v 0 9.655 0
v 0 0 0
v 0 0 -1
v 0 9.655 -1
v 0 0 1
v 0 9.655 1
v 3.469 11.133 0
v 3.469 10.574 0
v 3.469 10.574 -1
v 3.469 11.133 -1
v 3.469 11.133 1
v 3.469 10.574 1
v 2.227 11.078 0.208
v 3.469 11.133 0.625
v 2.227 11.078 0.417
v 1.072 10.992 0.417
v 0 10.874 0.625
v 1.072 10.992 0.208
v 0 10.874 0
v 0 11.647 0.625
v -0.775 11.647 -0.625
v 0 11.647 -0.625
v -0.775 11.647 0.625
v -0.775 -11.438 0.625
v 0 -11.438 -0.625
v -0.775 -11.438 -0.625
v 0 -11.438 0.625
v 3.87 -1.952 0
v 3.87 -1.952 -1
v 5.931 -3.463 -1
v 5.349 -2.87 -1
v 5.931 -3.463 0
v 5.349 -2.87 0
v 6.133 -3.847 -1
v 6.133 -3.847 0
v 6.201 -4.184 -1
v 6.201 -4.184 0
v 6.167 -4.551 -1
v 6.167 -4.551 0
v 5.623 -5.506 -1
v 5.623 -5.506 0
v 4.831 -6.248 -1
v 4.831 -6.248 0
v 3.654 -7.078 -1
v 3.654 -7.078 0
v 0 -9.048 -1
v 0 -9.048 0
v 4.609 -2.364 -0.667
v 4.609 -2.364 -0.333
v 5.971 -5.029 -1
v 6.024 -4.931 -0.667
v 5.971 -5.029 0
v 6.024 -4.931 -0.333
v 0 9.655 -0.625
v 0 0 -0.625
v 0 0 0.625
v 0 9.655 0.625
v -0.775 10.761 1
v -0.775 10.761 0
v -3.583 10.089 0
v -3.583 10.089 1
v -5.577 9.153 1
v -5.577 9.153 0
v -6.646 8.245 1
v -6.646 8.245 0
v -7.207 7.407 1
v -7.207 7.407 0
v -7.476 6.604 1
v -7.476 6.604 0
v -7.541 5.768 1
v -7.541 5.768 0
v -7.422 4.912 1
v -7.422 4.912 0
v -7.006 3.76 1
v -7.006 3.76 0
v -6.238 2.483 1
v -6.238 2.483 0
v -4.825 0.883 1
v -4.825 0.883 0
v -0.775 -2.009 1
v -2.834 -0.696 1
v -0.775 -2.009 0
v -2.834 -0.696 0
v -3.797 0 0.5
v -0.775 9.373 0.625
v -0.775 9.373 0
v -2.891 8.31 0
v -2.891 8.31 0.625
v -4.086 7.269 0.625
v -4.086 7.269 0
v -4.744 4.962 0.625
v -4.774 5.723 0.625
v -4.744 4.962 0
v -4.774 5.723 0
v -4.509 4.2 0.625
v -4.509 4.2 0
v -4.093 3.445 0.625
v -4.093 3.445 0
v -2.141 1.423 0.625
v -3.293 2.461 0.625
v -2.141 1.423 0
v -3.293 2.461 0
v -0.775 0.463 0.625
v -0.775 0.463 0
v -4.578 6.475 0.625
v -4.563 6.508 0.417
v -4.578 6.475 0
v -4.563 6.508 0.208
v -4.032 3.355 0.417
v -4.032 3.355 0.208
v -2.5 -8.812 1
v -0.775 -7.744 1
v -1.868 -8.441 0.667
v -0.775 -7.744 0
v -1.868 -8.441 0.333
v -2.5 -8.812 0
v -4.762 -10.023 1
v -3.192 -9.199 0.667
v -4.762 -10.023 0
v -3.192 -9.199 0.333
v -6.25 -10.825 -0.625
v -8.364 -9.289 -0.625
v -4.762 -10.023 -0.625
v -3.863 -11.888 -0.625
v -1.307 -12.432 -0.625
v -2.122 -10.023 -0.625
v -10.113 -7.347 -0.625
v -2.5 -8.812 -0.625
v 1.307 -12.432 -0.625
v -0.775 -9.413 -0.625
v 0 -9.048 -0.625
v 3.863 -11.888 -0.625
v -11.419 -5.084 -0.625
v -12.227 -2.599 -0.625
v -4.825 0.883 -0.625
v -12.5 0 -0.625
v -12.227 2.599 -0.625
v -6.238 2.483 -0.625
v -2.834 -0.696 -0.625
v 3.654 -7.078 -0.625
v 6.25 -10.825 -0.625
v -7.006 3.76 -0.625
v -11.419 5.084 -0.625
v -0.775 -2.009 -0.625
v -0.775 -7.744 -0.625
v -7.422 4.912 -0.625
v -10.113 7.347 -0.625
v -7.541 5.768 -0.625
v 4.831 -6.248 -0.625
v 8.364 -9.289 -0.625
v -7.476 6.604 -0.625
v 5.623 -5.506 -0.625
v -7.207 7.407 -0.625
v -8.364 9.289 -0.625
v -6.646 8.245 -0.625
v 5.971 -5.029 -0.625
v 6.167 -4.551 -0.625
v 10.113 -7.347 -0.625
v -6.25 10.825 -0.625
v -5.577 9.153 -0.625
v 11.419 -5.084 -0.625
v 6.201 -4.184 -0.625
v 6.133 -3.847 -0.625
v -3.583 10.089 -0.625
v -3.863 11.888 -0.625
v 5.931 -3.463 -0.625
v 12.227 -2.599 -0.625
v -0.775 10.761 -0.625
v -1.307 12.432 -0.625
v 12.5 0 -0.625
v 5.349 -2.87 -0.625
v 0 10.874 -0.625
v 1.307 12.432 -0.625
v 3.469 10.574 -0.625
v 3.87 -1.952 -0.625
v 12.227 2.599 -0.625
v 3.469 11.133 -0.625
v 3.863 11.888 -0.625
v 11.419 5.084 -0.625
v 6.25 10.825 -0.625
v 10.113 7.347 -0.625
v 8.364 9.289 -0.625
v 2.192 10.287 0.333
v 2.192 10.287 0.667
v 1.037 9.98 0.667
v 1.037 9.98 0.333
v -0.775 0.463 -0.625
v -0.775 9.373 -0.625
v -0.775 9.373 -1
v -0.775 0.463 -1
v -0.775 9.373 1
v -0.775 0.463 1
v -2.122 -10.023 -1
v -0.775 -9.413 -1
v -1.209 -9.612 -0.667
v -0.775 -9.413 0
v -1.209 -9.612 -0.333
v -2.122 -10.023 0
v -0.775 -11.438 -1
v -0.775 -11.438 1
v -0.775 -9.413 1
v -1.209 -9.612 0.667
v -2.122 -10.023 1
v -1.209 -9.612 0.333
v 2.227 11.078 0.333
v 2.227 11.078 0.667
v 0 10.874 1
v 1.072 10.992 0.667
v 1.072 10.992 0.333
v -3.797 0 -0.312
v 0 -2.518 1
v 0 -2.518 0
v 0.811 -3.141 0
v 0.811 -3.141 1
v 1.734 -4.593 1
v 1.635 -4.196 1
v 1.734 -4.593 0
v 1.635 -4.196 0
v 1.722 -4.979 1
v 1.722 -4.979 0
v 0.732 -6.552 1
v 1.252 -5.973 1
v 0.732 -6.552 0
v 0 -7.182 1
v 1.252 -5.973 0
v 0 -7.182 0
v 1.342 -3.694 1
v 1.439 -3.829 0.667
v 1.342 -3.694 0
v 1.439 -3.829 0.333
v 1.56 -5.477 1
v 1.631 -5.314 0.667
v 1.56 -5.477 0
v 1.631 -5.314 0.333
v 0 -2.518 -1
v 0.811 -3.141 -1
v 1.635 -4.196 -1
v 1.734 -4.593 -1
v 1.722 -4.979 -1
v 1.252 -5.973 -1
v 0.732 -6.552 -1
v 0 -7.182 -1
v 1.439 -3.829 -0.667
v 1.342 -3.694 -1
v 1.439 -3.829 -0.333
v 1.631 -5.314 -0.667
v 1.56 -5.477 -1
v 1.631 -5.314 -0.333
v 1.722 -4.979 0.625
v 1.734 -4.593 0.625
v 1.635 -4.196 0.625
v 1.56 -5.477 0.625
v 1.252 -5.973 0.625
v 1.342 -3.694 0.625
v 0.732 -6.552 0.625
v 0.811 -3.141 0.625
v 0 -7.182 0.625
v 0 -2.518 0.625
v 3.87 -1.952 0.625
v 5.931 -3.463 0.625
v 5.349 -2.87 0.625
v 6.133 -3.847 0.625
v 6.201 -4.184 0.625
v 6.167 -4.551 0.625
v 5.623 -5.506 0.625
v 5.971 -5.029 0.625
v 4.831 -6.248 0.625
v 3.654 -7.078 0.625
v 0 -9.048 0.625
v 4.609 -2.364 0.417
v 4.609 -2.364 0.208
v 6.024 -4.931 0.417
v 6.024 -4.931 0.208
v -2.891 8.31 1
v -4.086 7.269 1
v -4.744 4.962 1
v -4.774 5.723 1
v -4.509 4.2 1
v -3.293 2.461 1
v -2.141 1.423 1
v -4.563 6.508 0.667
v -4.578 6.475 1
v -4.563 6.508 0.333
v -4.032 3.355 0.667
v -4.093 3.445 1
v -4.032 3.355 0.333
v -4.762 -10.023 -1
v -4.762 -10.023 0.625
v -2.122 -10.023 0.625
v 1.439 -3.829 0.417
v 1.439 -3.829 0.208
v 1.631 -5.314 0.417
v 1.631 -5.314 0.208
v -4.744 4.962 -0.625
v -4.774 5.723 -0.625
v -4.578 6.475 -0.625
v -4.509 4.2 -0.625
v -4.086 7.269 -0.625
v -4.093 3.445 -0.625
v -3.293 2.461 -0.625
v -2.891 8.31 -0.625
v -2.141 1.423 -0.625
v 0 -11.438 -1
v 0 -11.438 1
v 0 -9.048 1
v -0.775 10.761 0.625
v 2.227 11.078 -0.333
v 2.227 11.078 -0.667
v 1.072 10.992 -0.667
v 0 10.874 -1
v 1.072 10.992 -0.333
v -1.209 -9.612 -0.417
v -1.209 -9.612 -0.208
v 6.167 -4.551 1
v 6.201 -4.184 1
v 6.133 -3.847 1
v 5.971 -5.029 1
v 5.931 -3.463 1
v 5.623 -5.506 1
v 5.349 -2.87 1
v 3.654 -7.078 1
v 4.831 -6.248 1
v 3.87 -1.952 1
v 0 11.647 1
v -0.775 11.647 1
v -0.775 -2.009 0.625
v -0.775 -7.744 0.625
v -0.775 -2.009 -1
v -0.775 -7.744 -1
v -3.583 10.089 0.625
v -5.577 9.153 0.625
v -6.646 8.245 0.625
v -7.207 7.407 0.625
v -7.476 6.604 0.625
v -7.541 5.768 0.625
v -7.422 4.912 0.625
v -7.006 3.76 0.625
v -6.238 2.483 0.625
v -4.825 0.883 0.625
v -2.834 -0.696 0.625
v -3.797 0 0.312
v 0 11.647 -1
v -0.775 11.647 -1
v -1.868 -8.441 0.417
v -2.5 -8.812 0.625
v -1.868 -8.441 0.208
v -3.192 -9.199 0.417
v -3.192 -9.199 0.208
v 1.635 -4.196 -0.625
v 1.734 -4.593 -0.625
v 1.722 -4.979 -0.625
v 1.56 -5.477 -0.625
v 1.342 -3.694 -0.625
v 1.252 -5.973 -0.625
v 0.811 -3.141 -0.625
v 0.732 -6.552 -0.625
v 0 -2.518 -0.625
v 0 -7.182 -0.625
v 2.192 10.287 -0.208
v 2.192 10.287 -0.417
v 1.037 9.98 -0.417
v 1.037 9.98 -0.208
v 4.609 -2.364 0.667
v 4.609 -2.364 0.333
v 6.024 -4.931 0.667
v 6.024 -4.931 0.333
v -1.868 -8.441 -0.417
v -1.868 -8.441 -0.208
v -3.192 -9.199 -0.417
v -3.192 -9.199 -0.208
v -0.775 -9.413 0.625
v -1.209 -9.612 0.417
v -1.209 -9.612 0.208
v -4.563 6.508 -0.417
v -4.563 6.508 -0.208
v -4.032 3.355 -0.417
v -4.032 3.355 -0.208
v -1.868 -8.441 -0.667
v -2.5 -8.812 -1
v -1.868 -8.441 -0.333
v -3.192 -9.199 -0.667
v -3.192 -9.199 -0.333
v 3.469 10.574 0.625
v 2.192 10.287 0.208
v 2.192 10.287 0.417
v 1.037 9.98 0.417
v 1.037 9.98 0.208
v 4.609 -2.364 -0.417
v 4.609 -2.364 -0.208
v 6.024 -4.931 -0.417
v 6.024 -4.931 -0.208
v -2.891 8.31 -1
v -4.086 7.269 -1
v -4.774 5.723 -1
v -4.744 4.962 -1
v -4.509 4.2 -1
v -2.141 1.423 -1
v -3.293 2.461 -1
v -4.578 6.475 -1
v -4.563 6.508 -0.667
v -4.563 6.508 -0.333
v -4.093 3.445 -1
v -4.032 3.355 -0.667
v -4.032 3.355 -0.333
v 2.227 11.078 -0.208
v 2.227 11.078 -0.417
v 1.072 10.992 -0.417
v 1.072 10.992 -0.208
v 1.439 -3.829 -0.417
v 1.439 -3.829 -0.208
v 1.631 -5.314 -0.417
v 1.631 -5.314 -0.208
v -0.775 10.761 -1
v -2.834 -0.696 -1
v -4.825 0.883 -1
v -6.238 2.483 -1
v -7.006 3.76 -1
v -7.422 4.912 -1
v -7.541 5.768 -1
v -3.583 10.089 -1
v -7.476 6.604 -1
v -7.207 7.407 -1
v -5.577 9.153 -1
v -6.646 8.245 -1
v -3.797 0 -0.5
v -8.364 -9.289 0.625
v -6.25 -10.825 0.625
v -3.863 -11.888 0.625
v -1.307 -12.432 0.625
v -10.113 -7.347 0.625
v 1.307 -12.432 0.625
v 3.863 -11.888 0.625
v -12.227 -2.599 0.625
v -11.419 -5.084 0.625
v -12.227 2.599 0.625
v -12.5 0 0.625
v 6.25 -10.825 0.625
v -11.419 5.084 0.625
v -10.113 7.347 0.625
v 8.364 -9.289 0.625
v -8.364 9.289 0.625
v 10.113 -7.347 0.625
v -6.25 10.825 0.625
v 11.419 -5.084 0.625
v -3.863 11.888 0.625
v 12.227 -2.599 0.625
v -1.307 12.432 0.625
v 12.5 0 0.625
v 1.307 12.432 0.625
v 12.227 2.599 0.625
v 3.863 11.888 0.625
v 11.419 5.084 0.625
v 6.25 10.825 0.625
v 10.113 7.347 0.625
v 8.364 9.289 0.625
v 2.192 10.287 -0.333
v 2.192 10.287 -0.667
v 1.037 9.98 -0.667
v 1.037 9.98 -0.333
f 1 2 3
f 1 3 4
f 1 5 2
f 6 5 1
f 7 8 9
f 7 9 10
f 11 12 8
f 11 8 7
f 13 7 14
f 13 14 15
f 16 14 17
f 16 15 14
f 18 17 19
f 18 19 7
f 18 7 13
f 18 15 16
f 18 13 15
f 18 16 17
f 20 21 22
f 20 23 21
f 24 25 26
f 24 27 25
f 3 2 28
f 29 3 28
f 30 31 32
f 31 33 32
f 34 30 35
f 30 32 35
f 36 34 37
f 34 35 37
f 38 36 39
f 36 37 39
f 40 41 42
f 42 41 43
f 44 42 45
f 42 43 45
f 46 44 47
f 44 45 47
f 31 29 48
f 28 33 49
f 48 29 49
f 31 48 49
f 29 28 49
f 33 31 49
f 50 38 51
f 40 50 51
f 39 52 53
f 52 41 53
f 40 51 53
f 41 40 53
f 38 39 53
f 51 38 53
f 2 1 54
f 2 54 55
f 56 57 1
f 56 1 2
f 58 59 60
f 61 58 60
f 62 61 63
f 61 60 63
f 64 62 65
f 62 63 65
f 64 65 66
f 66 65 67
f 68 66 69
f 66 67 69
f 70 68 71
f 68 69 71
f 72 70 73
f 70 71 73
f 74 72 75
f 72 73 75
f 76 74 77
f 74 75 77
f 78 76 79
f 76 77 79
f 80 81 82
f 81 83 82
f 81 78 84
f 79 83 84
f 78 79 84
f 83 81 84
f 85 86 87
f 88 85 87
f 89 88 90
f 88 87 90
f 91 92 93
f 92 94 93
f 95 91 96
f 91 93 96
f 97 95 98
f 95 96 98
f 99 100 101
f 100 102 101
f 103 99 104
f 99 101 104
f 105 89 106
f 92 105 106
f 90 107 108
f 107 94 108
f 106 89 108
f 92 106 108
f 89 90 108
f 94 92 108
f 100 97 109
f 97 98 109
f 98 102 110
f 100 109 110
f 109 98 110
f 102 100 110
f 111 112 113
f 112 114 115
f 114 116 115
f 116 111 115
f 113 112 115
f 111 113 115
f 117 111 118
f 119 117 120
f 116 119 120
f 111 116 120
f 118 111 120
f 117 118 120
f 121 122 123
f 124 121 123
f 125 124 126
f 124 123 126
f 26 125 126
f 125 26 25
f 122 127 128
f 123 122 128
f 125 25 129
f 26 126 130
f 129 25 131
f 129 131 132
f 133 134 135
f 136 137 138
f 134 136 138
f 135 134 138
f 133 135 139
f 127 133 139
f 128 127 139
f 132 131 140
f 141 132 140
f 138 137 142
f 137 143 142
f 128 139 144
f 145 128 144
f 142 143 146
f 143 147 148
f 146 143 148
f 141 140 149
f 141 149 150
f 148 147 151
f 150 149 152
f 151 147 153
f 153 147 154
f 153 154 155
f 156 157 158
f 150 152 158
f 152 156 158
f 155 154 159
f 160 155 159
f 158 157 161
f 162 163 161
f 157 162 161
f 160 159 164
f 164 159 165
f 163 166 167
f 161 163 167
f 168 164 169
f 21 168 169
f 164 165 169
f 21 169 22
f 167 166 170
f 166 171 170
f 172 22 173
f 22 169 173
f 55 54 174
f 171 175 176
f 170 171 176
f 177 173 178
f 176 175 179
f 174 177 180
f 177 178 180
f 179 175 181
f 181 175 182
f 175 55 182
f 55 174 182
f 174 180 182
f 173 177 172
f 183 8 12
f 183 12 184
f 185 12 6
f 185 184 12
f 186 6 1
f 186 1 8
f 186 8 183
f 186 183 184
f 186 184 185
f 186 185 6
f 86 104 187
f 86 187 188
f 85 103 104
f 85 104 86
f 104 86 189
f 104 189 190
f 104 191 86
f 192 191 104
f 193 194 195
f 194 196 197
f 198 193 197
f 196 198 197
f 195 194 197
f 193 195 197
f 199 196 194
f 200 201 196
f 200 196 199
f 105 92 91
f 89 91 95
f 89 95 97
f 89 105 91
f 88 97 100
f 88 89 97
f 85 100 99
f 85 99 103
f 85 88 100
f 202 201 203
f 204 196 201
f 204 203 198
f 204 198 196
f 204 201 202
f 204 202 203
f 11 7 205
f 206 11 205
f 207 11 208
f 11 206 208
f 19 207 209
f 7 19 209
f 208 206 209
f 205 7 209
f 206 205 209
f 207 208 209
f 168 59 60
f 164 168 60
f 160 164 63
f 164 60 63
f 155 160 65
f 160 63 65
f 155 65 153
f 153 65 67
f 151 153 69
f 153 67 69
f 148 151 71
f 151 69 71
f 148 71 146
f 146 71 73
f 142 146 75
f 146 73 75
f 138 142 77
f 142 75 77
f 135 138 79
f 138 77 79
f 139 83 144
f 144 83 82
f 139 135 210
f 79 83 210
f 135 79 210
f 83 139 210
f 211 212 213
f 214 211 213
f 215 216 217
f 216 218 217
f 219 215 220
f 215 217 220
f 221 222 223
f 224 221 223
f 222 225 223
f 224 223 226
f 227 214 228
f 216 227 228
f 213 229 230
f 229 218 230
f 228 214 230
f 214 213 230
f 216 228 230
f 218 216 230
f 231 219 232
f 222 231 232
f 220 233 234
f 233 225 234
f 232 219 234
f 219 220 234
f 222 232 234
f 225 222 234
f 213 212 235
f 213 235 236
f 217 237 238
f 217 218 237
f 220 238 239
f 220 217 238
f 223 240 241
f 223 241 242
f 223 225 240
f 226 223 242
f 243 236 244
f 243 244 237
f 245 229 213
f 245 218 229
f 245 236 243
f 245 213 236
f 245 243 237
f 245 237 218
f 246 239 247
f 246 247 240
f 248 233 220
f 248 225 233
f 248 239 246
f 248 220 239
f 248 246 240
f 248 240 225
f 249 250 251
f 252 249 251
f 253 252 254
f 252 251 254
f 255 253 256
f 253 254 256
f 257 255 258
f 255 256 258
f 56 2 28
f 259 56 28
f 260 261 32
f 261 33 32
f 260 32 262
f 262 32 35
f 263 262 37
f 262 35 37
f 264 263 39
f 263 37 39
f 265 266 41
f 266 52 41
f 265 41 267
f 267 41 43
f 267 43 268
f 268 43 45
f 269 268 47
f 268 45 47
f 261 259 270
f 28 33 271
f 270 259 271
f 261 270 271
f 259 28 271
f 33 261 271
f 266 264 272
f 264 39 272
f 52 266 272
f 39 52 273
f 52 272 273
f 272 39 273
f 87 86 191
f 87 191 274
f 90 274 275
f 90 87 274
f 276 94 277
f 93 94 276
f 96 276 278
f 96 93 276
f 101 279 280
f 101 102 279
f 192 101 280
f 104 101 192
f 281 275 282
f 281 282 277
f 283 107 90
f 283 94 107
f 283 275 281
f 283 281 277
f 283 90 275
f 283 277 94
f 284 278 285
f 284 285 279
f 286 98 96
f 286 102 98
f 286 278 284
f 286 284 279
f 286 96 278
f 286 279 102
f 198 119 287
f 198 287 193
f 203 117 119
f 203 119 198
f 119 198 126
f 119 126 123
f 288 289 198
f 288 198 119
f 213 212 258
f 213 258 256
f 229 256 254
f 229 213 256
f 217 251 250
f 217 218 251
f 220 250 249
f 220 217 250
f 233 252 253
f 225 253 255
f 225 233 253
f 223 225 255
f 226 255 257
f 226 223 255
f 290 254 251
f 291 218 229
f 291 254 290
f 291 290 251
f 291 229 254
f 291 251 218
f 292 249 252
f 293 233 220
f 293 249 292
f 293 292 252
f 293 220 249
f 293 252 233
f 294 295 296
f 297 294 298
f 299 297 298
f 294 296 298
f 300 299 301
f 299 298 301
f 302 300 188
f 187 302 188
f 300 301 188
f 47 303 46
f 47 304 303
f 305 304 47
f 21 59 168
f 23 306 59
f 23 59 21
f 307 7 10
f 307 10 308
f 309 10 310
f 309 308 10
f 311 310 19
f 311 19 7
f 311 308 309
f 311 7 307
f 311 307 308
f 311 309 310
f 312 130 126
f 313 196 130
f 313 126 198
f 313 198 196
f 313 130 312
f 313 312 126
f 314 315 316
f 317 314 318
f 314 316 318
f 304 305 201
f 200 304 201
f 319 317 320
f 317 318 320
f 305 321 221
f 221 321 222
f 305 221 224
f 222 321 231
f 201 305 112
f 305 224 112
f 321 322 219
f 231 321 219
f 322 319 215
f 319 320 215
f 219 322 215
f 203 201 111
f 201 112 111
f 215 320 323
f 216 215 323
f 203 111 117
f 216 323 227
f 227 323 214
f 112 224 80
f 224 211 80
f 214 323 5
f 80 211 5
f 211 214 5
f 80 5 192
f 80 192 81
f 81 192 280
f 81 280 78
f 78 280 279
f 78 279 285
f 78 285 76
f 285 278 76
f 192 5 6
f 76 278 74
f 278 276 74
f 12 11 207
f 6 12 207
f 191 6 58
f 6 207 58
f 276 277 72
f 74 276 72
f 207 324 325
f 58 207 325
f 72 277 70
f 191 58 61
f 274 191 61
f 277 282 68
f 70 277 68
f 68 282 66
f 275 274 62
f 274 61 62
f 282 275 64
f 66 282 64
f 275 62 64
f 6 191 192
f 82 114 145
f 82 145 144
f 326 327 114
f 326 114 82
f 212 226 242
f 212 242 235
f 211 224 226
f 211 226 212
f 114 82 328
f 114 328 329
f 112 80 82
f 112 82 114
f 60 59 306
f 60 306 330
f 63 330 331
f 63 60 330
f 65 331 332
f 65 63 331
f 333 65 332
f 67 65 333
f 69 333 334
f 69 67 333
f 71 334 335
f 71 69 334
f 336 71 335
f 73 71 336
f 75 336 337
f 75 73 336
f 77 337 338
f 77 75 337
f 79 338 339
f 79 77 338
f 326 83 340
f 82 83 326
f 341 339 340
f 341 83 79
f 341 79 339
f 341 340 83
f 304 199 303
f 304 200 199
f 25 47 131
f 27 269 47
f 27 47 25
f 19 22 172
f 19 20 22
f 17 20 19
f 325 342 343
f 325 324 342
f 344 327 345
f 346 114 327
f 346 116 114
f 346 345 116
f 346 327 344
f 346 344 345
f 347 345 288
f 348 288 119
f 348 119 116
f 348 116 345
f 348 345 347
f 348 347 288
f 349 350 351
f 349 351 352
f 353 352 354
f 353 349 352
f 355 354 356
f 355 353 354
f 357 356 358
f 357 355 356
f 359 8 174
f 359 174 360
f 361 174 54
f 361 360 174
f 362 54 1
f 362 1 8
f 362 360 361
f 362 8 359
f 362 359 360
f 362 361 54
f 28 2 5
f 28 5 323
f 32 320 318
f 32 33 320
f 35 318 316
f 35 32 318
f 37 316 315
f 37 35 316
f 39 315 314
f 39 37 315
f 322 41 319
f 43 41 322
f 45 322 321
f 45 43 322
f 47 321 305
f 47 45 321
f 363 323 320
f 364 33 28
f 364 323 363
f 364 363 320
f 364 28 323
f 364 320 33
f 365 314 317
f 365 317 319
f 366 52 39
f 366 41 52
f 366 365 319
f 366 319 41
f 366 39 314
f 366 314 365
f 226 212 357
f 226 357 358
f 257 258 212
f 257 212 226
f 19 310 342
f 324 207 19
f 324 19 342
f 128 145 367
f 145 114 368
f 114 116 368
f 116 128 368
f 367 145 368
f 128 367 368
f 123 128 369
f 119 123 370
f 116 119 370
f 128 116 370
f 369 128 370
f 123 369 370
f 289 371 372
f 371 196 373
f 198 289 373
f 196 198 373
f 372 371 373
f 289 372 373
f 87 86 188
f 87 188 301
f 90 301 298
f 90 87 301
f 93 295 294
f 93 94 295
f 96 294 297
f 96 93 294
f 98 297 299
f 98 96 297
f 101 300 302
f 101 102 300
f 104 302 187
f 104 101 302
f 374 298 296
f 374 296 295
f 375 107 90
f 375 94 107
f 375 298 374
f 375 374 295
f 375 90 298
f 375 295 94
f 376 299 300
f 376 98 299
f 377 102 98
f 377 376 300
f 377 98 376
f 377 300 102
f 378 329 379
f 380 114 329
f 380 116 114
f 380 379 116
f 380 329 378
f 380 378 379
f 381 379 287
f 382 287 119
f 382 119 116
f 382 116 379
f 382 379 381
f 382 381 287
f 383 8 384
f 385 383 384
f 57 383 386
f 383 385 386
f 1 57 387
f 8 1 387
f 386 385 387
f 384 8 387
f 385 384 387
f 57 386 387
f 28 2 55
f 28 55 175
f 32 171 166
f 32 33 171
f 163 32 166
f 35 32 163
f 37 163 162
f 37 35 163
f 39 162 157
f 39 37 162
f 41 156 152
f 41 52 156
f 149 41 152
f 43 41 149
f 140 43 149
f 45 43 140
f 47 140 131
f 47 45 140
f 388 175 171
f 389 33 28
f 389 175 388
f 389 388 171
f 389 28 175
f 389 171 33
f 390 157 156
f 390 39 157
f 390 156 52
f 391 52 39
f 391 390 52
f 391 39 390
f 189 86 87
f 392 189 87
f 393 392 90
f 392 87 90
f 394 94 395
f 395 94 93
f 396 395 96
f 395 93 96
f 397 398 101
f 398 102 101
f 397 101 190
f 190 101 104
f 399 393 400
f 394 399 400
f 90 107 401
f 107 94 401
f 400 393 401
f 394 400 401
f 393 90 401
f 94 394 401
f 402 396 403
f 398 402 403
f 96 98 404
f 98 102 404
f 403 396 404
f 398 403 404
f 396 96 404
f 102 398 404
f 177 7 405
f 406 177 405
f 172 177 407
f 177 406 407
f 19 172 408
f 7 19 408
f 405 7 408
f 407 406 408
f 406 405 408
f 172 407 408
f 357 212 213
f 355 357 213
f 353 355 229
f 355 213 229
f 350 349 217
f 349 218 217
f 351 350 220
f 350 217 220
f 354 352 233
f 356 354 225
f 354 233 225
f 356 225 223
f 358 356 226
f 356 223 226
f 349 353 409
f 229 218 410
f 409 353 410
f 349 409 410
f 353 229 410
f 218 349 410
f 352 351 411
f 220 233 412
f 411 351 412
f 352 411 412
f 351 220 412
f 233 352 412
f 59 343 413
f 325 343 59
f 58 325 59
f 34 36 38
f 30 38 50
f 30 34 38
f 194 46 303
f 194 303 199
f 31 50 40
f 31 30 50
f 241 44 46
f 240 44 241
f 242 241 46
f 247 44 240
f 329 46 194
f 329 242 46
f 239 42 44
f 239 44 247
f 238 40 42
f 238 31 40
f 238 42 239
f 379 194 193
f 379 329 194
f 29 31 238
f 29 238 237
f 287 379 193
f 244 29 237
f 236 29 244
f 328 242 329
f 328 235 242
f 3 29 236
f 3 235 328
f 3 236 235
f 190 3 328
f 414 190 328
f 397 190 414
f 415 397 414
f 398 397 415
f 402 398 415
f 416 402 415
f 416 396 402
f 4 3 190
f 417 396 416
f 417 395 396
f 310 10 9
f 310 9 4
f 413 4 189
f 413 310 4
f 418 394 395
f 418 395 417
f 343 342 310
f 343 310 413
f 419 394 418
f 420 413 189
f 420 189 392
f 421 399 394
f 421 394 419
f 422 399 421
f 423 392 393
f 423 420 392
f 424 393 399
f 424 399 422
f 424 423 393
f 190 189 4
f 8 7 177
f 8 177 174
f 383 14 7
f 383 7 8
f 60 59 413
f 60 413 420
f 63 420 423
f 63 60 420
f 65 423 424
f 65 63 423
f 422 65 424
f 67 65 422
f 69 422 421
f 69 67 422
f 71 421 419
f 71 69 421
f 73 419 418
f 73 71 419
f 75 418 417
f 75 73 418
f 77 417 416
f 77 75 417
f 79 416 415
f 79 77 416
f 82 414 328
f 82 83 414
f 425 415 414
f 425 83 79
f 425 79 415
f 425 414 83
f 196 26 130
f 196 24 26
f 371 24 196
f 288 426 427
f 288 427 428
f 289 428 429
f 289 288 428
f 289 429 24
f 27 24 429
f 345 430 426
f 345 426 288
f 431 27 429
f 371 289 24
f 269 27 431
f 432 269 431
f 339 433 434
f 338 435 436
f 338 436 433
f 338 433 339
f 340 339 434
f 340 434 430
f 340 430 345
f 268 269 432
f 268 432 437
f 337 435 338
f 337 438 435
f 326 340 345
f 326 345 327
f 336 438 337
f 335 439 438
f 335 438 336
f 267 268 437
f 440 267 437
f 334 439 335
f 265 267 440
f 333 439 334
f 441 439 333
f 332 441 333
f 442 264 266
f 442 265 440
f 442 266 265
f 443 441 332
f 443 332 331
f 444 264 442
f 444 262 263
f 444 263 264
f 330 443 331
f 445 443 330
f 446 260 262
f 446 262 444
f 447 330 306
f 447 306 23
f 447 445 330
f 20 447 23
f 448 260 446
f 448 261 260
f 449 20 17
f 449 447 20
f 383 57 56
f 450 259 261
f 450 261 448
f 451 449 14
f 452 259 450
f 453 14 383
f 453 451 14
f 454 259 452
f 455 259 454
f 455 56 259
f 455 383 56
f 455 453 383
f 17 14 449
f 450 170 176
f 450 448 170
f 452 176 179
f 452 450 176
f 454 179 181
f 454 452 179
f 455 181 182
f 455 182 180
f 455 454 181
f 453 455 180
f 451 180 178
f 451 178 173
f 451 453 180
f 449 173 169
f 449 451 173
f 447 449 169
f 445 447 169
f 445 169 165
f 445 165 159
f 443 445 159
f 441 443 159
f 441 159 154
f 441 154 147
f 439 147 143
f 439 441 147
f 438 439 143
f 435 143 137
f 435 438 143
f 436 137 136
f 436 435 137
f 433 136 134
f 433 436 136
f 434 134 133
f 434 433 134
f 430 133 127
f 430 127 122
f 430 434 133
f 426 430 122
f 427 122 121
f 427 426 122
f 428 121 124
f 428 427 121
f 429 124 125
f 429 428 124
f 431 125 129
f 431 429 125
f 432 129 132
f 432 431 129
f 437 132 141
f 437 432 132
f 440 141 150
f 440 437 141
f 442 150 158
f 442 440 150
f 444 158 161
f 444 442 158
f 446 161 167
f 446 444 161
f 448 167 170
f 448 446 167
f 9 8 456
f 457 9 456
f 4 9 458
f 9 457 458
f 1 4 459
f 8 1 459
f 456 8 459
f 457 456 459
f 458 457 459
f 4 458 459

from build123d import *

# Parameters (mm, degrees)
F0_R     = 12.5
F1_DEPTH = 0.625
F2_DEPTH = 1


with BuildPart() as f1:
    # F0 (on Top) → F1 (new body, symmetric)
    with BuildSketch(Plane.XY):
        Circle(F0_R)
        with BuildLine():
            Line((3.469013609, 11.1325038597), (3.469013609, 10.5737236289))
            add(Edge.make_bspline(
                [(3.469013609, 10.5737236289), (2.1295310147, 10.2970913139), (0.9793041014, 9.9888926875), (0, 9.655447705)],
                knots=[0, 0, 0, 0, 0.0564438089, 0.0564438089, 0.0564438089, 0.0564438089], degree=3))
            Line((0, 9.655447705), (0, 0))
            add(Edge.make_bspline(
                [(0, 0), (4.7897576398, -2.7124564463), (11.1595160542, -3.7053488117), (0, -9.0481404075)],
                knots=[0.5103349284, 0.5103349284, 0.5103349284, 0.5103349284, 0.9731575335, 0.9731575335, 0.9731575335, 0.9731575335], degree=3))
            Line((0, -9.0481404075), (0, -11.43758744))
            Line((0, -11.43758744), (-0.7749350043, -11.43758744))
            Line((-0.7749350043, -11.43758744), (-0.7749350043, -9.4130570546))
            add(Edge.make_bspline(
                [(-0.7749350043, -9.4130570546), (-1.2009520677, -9.6105223834), (-1.6497795787, -9.8136858366), (-2.1222827306, -10.022822216)],
                knots=[0.9835042945, 0.9835042945, 0.9835042945, 0.9835042945, 1, 1, 1, 1], degree=3))
            Line((-2.1222827306, -10.022822216), (-4.7616744414, -10.022822216))
            add(Edge.make_bspline(
                [(-0.7749350043, -7.7441201795), (-1.7569134715, -8.4127257105), (-3.0643409272, -9.1644007059), (-4.7616744414, -10.022822216)],
                knots=[0.9307090471, 0.9307090471, 0.9307090471, 0.9307090471, 1, 1, 1, 1], degree=3))
            Line((-0.7749350043, -7.7441201795), (-0.7749350043, -2.0086095272))
            add(Edge.make_bspline(
                [(-0.7749350043, 10.7614904305), (-10.4506616594, 9.2054766823), (-7.6065922045, 2.0517963529), (-1.7244596317, -1.4061301092), (-0.7749350043, -2.0086095272)],
                knots=[0.0597793128, 0.0597793128, 0.0597793128, 0.0597793128, 0.5346738425, 0.6424901257, 0.6424901257, 0.6424901257, 0.6424901257], degree=3))
            Line((-0.7749350043, 10.7614904305), (-0.7749350043, 11.6469217464))
            Line((-0.7749350043, 11.6469217464), (0, 11.6469217464))
            Line((0, 11.6469217464), (0, 10.8735224005))
            add(Edge.make_bspline(
                [(3.469013609, 11.1325038597), (2.1834638751, 11.0951609113), (1.0304529742, 11.006589692), (0, 10.8735224005)],
                knots=[0, 0, 0, 0, 0.0474976509, 0.0474976509, 0.0474976509, 0.0474976509], degree=3))
        make_face(mode=Mode.SUBTRACT)
    extrude(amount=F1_DEPTH, both=True)


with BuildPart() as f1b:
    # F0 (on Top) → F1, piece 2 (new body, symmetric)
    with BuildSketch(Plane.XY):
        with BuildLine():
            Line((-0.7749350043, 0.4629873961), (-0.7749350043, 9.3726434612))
            add(Edge.make_bspline(
                [(-0.7749350043, 9.3726434612), (-7.2543752333, 6.8353887137), (-4.8643202342, 3.0415711892), (-0.7749350043, 0.4629873961)],
                knots=[0.0720806097, 0.0720806097, 0.0720806097, 0.0720806097, 0.4848579816, 0.4848579816, 0.4848579816, 0.4848579816], degree=3))
        make_face()
    extrude(amount=F1_DEPTH, both=True)


with BuildPart() as f1c:
    # F0 (on Top) → F1, piece 3 (new body, symmetric)
    with BuildSketch(Plane.XY):
        with BuildLine():
            add(Edge.make_bspline(
                [(0, -2.5184561726), (1.8710484062, -3.8133227091), (2.7335754881, -5.0509767976), (0, -7.1819160441)],
                knots=[0.6733250753, 0.6733250753, 0.6733250753, 0.6733250753, 0.9105813345, 0.9105813345, 0.9105813345, 0.9105813345], degree=3))
            Line((0, -2.5184561726), (0, -7.1819160441))
        make_face()
    extrude(amount=F1_DEPTH, both=True)


with BuildPart() as f2:
    # F0 (on Top) → F2 (new body, symmetric)
    with BuildSketch(Plane.XY):
        with BuildLine():
            add(Edge.make_bspline(
                [(-0.7749350043, 9.3726434612), (-7.2543752333, 6.8353887137), (-4.8643202342, 3.0415711892), (-0.7749350043, 0.4629873961)],
                knots=[0.0720806097, 0.0720806097, 0.0720806097, 0.0720806097, 0.4848579816, 0.4848579816, 0.4848579816, 0.4848579816], degree=3))
            Line((-0.7749350043, 9.3726434612), (-0.7749350043, 10.7614904305))
            add(Edge.make_bspline(
                [(-0.7749350043, 10.7614904305), (-10.4506616594, 9.2054766823), (-7.6065922045, 2.0517963529), (-1.7244596317, -1.4061301092), (-0.7749350043, -2.0086095272)],
                knots=[0.0597793128, 0.0597793128, 0.0597793128, 0.0597793128, 0.5346738425, 0.6424901257, 0.6424901257, 0.6424901257, 0.6424901257], degree=3))
            Line((-0.7749350043, -2.0086095272), (-0.7749350043, 0.4629873961))
        make_face()
        with BuildLine():
            Line((0, -2.5184561726), (0, 0))
            add(Edge.make_bspline(
                [(-0.7749350043, 0.4629873961), (-0.5225349044, 0.3038351591), (-0.2636612802, 0.149312302), (0, 0)],
                knots=[0.4848579816, 0.4848579816, 0.4848579816, 0.4848579816, 0.5103349284, 0.5103349284, 0.5103349284, 0.5103349284], degree=3))
            Line((-0.7749350043, 0.4629873961), (-0.7749350043, -2.0086095272))
            add(Edge.make_bspline(
                [(-0.7749350043, -2.0086095272), (-0.5033754302, -2.1809158049), (-0.2431703313, -2.3501691717), (0, -2.5184561726)],
                knots=[0.6424901257, 0.6424901257, 0.6424901257, 0.6424901257, 0.6733250753, 0.6733250753, 0.6733250753, 0.6733250753], degree=3))
        make_face()
        with BuildLine():
            add(Edge.make_bspline(
                [(0, 10.8735224005), (-0.2664484418, 10.8391146465), (-0.5247025919, 10.8017318602), (-0.7749350043, 10.7614904305)],
                knots=[0.0474976509, 0.0474976509, 0.0474976509, 0.0474976509, 0.0597793128, 0.0597793128, 0.0597793128, 0.0597793128], degree=3))
            Line((0, 10.8735224005), (0, 11.6469217464))
            Line((0, 11.6469217464), (-0.7749350043, 11.6469217464))
            Line((-0.7749350043, 11.6469217464), (-0.7749350043, 10.7614904305))
        make_face()
        with BuildLine():
            add(Edge.make_bspline(
                [(0, 9.655447705), (-0.2712996063, 9.5630724231), (-0.529481346, 9.4687595512), (-0.7749350043, 9.3726434612)],
                knots=[0.0564438089, 0.0564438089, 0.0564438089, 0.0564438089, 0.0720806097, 0.0720806097, 0.0720806097, 0.0720806097], degree=3))
            Line((0, 9.655447705), (0, 10.8735224005))
            add(Edge.make_bspline(
                [(0, 10.8735224005), (-0.2664484418, 10.8391146465), (-0.5247025919, 10.8017318602), (-0.7749350043, 10.7614904305)],
                knots=[0.0474976509, 0.0474976509, 0.0474976509, 0.0474976509, 0.0597793128, 0.0597793128, 0.0597793128, 0.0597793128], degree=3))
            Line((-0.7749350043, 10.7614904305), (-0.7749350043, 9.3726434612))
        make_face()
        with BuildLine():
            add(Edge.make_bspline(
                [(3.469013609, 10.5737236289), (2.1295310147, 10.2970913139), (0.9793041014, 9.9888926875), (0, 9.655447705)],
                knots=[0, 0, 0, 0, 0.0564438089, 0.0564438089, 0.0564438089, 0.0564438089], degree=3))
            Line((3.469013609, 10.5737236289), (3.469013609, 11.1325038597))
            add(Edge.make_bspline(
                [(3.469013609, 11.1325038597), (2.1834638751, 11.0951609113), (1.0304529742, 11.006589692), (0, 10.8735224005)],
                knots=[0, 0, 0, 0, 0.0474976509, 0.0474976509, 0.0474976509, 0.0474976509], degree=3))
            Line((0, 10.8735224005), (0, 9.655447705))
        make_face()
        with BuildLine():
            Line((0, 0), (0, 9.655447705))
            add(Edge.make_bspline(
                [(0, 9.655447705), (-0.2712996063, 9.5630724231), (-0.529481346, 9.4687595512), (-0.7749350043, 9.3726434612)],
                knots=[0.0564438089, 0.0564438089, 0.0564438089, 0.0564438089, 0.0720806097, 0.0720806097, 0.0720806097, 0.0720806097], degree=3))
            Line((-0.7749350043, 9.3726434612), (-0.7749350043, 0.4629873961))
            add(Edge.make_bspline(
                [(-0.7749350043, 0.4629873961), (-0.5225349044, 0.3038351591), (-0.2636612802, 0.149312302), (0, 0)],
                knots=[0.4848579816, 0.4848579816, 0.4848579816, 0.4848579816, 0.5103349284, 0.5103349284, 0.5103349284, 0.5103349284], degree=3))
        make_face()
        with BuildLine():
            Line((0, -7.1819160441), (0, -2.5184561726))
            add(Edge.make_bspline(
                [(-0.7749350043, -2.0086095272), (-0.5033754302, -2.1809158049), (-0.2431703313, -2.3501691717), (0, -2.5184561726)],
                knots=[0.6424901257, 0.6424901257, 0.6424901257, 0.6424901257, 0.6733250753, 0.6733250753, 0.6733250753, 0.6733250753], degree=3))
            Line((-0.7749350043, -2.0086095272), (-0.7749350043, -7.7441201795))
            add(Edge.make_bspline(
                [(0, -7.1819160441), (-0.2319037729, -7.3626949738), (-0.4896888142, -7.5499029062), (-0.7749350043, -7.7441201795)],
                knots=[0.9105813345, 0.9105813345, 0.9105813345, 0.9105813345, 0.9307090471, 0.9307090471, 0.9307090471, 0.9307090471], degree=3))
        make_face()
        with BuildLine():
            Line((0, -11.43758744), (0, -9.0481404075))
            add(Edge.make_bspline(
                [(0, -9.0481404075), (-0.2494797012, -9.1675826884), (-0.5077202, -9.289198966), (-0.7749350043, -9.4130570546)],
                knots=[0.9731575335, 0.9731575335, 0.9731575335, 0.9731575335, 0.9835042945, 0.9835042945, 0.9835042945, 0.9835042945], degree=3))
            Line((-0.7749350043, -9.4130570546), (-0.7749350043, -11.43758744))
            Line((-0.7749350043, -11.43758744), (0, -11.43758744))
        make_face()
        with BuildLine():
            add(Edge.make_bspline(
                [(-0.7749350043, -9.4130570546), (-1.2009520677, -9.6105223834), (-1.6497795787, -9.8136858366), (-2.1222827306, -10.022822216)],
                knots=[0.9835042945, 0.9835042945, 0.9835042945, 0.9835042945, 1, 1, 1, 1], degree=3))
            Line((-0.7749350043, -9.4130570546), (-0.7749350043, -7.7441201795))
            add(Edge.make_bspline(
                [(-0.7749350043, -7.7441201795), (-1.7569134715, -8.4127257105), (-3.0643409272, -9.1644007059), (-4.7616744414, -10.022822216)],
                knots=[0.9307090471, 0.9307090471, 0.9307090471, 0.9307090471, 1, 1, 1, 1], degree=3))
            Line((-4.7616744414, -10.022822216), (-2.1222827306, -10.022822216))
        make_face()
        with BuildLine():
            add(Edge.make_bspline(
                [(0, -9.0481404075), (-0.2494797012, -9.1675826884), (-0.5077202, -9.289198966), (-0.7749350043, -9.4130570546)],
                knots=[0.9731575335, 0.9731575335, 0.9731575335, 0.9731575335, 0.9835042945, 0.9835042945, 0.9835042945, 0.9835042945], degree=3))
            Line((0, -9.0481404075), (0, -7.1819160441))
            add(Edge.make_bspline(
                [(0, -7.1819160441), (-0.2319037729, -7.3626949738), (-0.4896888142, -7.5499029062), (-0.7749350043, -7.7441201795)],
                knots=[0.9105813345, 0.9105813345, 0.9105813345, 0.9105813345, 0.9307090471, 0.9307090471, 0.9307090471, 0.9307090471], degree=3))
            Line((-0.7749350043, -7.7441201795), (-0.7749350043, -9.4130570546))
        make_face()
        with BuildLine():
            add(Edge.make_bspline(
                [(0, 0), (4.7897576398, -2.7124564463), (11.1595160542, -3.7053488117), (0, -9.0481404075)],
                knots=[0.5103349284, 0.5103349284, 0.5103349284, 0.5103349284, 0.9731575335, 0.9731575335, 0.9731575335, 0.9731575335], degree=3))
            Line((0, 0), (0, -2.5184561726))
            add(Edge.make_bspline(
                [(0, -2.5184561726), (1.8710484062, -3.8133227091), (2.7335754881, -5.0509767976), (0, -7.1819160441)],
                knots=[0.6733250753, 0.6733250753, 0.6733250753, 0.6733250753, 0.9105813345, 0.9105813345, 0.9105813345, 0.9105813345], degree=3))
            Line((0, -7.1819160441), (0, -9.0481404075))
        make_face()
    extrude(amount=F2_DEPTH, both=True)


solid = Compound([f1.part, f1b.part, f1c.part, f2.part])
